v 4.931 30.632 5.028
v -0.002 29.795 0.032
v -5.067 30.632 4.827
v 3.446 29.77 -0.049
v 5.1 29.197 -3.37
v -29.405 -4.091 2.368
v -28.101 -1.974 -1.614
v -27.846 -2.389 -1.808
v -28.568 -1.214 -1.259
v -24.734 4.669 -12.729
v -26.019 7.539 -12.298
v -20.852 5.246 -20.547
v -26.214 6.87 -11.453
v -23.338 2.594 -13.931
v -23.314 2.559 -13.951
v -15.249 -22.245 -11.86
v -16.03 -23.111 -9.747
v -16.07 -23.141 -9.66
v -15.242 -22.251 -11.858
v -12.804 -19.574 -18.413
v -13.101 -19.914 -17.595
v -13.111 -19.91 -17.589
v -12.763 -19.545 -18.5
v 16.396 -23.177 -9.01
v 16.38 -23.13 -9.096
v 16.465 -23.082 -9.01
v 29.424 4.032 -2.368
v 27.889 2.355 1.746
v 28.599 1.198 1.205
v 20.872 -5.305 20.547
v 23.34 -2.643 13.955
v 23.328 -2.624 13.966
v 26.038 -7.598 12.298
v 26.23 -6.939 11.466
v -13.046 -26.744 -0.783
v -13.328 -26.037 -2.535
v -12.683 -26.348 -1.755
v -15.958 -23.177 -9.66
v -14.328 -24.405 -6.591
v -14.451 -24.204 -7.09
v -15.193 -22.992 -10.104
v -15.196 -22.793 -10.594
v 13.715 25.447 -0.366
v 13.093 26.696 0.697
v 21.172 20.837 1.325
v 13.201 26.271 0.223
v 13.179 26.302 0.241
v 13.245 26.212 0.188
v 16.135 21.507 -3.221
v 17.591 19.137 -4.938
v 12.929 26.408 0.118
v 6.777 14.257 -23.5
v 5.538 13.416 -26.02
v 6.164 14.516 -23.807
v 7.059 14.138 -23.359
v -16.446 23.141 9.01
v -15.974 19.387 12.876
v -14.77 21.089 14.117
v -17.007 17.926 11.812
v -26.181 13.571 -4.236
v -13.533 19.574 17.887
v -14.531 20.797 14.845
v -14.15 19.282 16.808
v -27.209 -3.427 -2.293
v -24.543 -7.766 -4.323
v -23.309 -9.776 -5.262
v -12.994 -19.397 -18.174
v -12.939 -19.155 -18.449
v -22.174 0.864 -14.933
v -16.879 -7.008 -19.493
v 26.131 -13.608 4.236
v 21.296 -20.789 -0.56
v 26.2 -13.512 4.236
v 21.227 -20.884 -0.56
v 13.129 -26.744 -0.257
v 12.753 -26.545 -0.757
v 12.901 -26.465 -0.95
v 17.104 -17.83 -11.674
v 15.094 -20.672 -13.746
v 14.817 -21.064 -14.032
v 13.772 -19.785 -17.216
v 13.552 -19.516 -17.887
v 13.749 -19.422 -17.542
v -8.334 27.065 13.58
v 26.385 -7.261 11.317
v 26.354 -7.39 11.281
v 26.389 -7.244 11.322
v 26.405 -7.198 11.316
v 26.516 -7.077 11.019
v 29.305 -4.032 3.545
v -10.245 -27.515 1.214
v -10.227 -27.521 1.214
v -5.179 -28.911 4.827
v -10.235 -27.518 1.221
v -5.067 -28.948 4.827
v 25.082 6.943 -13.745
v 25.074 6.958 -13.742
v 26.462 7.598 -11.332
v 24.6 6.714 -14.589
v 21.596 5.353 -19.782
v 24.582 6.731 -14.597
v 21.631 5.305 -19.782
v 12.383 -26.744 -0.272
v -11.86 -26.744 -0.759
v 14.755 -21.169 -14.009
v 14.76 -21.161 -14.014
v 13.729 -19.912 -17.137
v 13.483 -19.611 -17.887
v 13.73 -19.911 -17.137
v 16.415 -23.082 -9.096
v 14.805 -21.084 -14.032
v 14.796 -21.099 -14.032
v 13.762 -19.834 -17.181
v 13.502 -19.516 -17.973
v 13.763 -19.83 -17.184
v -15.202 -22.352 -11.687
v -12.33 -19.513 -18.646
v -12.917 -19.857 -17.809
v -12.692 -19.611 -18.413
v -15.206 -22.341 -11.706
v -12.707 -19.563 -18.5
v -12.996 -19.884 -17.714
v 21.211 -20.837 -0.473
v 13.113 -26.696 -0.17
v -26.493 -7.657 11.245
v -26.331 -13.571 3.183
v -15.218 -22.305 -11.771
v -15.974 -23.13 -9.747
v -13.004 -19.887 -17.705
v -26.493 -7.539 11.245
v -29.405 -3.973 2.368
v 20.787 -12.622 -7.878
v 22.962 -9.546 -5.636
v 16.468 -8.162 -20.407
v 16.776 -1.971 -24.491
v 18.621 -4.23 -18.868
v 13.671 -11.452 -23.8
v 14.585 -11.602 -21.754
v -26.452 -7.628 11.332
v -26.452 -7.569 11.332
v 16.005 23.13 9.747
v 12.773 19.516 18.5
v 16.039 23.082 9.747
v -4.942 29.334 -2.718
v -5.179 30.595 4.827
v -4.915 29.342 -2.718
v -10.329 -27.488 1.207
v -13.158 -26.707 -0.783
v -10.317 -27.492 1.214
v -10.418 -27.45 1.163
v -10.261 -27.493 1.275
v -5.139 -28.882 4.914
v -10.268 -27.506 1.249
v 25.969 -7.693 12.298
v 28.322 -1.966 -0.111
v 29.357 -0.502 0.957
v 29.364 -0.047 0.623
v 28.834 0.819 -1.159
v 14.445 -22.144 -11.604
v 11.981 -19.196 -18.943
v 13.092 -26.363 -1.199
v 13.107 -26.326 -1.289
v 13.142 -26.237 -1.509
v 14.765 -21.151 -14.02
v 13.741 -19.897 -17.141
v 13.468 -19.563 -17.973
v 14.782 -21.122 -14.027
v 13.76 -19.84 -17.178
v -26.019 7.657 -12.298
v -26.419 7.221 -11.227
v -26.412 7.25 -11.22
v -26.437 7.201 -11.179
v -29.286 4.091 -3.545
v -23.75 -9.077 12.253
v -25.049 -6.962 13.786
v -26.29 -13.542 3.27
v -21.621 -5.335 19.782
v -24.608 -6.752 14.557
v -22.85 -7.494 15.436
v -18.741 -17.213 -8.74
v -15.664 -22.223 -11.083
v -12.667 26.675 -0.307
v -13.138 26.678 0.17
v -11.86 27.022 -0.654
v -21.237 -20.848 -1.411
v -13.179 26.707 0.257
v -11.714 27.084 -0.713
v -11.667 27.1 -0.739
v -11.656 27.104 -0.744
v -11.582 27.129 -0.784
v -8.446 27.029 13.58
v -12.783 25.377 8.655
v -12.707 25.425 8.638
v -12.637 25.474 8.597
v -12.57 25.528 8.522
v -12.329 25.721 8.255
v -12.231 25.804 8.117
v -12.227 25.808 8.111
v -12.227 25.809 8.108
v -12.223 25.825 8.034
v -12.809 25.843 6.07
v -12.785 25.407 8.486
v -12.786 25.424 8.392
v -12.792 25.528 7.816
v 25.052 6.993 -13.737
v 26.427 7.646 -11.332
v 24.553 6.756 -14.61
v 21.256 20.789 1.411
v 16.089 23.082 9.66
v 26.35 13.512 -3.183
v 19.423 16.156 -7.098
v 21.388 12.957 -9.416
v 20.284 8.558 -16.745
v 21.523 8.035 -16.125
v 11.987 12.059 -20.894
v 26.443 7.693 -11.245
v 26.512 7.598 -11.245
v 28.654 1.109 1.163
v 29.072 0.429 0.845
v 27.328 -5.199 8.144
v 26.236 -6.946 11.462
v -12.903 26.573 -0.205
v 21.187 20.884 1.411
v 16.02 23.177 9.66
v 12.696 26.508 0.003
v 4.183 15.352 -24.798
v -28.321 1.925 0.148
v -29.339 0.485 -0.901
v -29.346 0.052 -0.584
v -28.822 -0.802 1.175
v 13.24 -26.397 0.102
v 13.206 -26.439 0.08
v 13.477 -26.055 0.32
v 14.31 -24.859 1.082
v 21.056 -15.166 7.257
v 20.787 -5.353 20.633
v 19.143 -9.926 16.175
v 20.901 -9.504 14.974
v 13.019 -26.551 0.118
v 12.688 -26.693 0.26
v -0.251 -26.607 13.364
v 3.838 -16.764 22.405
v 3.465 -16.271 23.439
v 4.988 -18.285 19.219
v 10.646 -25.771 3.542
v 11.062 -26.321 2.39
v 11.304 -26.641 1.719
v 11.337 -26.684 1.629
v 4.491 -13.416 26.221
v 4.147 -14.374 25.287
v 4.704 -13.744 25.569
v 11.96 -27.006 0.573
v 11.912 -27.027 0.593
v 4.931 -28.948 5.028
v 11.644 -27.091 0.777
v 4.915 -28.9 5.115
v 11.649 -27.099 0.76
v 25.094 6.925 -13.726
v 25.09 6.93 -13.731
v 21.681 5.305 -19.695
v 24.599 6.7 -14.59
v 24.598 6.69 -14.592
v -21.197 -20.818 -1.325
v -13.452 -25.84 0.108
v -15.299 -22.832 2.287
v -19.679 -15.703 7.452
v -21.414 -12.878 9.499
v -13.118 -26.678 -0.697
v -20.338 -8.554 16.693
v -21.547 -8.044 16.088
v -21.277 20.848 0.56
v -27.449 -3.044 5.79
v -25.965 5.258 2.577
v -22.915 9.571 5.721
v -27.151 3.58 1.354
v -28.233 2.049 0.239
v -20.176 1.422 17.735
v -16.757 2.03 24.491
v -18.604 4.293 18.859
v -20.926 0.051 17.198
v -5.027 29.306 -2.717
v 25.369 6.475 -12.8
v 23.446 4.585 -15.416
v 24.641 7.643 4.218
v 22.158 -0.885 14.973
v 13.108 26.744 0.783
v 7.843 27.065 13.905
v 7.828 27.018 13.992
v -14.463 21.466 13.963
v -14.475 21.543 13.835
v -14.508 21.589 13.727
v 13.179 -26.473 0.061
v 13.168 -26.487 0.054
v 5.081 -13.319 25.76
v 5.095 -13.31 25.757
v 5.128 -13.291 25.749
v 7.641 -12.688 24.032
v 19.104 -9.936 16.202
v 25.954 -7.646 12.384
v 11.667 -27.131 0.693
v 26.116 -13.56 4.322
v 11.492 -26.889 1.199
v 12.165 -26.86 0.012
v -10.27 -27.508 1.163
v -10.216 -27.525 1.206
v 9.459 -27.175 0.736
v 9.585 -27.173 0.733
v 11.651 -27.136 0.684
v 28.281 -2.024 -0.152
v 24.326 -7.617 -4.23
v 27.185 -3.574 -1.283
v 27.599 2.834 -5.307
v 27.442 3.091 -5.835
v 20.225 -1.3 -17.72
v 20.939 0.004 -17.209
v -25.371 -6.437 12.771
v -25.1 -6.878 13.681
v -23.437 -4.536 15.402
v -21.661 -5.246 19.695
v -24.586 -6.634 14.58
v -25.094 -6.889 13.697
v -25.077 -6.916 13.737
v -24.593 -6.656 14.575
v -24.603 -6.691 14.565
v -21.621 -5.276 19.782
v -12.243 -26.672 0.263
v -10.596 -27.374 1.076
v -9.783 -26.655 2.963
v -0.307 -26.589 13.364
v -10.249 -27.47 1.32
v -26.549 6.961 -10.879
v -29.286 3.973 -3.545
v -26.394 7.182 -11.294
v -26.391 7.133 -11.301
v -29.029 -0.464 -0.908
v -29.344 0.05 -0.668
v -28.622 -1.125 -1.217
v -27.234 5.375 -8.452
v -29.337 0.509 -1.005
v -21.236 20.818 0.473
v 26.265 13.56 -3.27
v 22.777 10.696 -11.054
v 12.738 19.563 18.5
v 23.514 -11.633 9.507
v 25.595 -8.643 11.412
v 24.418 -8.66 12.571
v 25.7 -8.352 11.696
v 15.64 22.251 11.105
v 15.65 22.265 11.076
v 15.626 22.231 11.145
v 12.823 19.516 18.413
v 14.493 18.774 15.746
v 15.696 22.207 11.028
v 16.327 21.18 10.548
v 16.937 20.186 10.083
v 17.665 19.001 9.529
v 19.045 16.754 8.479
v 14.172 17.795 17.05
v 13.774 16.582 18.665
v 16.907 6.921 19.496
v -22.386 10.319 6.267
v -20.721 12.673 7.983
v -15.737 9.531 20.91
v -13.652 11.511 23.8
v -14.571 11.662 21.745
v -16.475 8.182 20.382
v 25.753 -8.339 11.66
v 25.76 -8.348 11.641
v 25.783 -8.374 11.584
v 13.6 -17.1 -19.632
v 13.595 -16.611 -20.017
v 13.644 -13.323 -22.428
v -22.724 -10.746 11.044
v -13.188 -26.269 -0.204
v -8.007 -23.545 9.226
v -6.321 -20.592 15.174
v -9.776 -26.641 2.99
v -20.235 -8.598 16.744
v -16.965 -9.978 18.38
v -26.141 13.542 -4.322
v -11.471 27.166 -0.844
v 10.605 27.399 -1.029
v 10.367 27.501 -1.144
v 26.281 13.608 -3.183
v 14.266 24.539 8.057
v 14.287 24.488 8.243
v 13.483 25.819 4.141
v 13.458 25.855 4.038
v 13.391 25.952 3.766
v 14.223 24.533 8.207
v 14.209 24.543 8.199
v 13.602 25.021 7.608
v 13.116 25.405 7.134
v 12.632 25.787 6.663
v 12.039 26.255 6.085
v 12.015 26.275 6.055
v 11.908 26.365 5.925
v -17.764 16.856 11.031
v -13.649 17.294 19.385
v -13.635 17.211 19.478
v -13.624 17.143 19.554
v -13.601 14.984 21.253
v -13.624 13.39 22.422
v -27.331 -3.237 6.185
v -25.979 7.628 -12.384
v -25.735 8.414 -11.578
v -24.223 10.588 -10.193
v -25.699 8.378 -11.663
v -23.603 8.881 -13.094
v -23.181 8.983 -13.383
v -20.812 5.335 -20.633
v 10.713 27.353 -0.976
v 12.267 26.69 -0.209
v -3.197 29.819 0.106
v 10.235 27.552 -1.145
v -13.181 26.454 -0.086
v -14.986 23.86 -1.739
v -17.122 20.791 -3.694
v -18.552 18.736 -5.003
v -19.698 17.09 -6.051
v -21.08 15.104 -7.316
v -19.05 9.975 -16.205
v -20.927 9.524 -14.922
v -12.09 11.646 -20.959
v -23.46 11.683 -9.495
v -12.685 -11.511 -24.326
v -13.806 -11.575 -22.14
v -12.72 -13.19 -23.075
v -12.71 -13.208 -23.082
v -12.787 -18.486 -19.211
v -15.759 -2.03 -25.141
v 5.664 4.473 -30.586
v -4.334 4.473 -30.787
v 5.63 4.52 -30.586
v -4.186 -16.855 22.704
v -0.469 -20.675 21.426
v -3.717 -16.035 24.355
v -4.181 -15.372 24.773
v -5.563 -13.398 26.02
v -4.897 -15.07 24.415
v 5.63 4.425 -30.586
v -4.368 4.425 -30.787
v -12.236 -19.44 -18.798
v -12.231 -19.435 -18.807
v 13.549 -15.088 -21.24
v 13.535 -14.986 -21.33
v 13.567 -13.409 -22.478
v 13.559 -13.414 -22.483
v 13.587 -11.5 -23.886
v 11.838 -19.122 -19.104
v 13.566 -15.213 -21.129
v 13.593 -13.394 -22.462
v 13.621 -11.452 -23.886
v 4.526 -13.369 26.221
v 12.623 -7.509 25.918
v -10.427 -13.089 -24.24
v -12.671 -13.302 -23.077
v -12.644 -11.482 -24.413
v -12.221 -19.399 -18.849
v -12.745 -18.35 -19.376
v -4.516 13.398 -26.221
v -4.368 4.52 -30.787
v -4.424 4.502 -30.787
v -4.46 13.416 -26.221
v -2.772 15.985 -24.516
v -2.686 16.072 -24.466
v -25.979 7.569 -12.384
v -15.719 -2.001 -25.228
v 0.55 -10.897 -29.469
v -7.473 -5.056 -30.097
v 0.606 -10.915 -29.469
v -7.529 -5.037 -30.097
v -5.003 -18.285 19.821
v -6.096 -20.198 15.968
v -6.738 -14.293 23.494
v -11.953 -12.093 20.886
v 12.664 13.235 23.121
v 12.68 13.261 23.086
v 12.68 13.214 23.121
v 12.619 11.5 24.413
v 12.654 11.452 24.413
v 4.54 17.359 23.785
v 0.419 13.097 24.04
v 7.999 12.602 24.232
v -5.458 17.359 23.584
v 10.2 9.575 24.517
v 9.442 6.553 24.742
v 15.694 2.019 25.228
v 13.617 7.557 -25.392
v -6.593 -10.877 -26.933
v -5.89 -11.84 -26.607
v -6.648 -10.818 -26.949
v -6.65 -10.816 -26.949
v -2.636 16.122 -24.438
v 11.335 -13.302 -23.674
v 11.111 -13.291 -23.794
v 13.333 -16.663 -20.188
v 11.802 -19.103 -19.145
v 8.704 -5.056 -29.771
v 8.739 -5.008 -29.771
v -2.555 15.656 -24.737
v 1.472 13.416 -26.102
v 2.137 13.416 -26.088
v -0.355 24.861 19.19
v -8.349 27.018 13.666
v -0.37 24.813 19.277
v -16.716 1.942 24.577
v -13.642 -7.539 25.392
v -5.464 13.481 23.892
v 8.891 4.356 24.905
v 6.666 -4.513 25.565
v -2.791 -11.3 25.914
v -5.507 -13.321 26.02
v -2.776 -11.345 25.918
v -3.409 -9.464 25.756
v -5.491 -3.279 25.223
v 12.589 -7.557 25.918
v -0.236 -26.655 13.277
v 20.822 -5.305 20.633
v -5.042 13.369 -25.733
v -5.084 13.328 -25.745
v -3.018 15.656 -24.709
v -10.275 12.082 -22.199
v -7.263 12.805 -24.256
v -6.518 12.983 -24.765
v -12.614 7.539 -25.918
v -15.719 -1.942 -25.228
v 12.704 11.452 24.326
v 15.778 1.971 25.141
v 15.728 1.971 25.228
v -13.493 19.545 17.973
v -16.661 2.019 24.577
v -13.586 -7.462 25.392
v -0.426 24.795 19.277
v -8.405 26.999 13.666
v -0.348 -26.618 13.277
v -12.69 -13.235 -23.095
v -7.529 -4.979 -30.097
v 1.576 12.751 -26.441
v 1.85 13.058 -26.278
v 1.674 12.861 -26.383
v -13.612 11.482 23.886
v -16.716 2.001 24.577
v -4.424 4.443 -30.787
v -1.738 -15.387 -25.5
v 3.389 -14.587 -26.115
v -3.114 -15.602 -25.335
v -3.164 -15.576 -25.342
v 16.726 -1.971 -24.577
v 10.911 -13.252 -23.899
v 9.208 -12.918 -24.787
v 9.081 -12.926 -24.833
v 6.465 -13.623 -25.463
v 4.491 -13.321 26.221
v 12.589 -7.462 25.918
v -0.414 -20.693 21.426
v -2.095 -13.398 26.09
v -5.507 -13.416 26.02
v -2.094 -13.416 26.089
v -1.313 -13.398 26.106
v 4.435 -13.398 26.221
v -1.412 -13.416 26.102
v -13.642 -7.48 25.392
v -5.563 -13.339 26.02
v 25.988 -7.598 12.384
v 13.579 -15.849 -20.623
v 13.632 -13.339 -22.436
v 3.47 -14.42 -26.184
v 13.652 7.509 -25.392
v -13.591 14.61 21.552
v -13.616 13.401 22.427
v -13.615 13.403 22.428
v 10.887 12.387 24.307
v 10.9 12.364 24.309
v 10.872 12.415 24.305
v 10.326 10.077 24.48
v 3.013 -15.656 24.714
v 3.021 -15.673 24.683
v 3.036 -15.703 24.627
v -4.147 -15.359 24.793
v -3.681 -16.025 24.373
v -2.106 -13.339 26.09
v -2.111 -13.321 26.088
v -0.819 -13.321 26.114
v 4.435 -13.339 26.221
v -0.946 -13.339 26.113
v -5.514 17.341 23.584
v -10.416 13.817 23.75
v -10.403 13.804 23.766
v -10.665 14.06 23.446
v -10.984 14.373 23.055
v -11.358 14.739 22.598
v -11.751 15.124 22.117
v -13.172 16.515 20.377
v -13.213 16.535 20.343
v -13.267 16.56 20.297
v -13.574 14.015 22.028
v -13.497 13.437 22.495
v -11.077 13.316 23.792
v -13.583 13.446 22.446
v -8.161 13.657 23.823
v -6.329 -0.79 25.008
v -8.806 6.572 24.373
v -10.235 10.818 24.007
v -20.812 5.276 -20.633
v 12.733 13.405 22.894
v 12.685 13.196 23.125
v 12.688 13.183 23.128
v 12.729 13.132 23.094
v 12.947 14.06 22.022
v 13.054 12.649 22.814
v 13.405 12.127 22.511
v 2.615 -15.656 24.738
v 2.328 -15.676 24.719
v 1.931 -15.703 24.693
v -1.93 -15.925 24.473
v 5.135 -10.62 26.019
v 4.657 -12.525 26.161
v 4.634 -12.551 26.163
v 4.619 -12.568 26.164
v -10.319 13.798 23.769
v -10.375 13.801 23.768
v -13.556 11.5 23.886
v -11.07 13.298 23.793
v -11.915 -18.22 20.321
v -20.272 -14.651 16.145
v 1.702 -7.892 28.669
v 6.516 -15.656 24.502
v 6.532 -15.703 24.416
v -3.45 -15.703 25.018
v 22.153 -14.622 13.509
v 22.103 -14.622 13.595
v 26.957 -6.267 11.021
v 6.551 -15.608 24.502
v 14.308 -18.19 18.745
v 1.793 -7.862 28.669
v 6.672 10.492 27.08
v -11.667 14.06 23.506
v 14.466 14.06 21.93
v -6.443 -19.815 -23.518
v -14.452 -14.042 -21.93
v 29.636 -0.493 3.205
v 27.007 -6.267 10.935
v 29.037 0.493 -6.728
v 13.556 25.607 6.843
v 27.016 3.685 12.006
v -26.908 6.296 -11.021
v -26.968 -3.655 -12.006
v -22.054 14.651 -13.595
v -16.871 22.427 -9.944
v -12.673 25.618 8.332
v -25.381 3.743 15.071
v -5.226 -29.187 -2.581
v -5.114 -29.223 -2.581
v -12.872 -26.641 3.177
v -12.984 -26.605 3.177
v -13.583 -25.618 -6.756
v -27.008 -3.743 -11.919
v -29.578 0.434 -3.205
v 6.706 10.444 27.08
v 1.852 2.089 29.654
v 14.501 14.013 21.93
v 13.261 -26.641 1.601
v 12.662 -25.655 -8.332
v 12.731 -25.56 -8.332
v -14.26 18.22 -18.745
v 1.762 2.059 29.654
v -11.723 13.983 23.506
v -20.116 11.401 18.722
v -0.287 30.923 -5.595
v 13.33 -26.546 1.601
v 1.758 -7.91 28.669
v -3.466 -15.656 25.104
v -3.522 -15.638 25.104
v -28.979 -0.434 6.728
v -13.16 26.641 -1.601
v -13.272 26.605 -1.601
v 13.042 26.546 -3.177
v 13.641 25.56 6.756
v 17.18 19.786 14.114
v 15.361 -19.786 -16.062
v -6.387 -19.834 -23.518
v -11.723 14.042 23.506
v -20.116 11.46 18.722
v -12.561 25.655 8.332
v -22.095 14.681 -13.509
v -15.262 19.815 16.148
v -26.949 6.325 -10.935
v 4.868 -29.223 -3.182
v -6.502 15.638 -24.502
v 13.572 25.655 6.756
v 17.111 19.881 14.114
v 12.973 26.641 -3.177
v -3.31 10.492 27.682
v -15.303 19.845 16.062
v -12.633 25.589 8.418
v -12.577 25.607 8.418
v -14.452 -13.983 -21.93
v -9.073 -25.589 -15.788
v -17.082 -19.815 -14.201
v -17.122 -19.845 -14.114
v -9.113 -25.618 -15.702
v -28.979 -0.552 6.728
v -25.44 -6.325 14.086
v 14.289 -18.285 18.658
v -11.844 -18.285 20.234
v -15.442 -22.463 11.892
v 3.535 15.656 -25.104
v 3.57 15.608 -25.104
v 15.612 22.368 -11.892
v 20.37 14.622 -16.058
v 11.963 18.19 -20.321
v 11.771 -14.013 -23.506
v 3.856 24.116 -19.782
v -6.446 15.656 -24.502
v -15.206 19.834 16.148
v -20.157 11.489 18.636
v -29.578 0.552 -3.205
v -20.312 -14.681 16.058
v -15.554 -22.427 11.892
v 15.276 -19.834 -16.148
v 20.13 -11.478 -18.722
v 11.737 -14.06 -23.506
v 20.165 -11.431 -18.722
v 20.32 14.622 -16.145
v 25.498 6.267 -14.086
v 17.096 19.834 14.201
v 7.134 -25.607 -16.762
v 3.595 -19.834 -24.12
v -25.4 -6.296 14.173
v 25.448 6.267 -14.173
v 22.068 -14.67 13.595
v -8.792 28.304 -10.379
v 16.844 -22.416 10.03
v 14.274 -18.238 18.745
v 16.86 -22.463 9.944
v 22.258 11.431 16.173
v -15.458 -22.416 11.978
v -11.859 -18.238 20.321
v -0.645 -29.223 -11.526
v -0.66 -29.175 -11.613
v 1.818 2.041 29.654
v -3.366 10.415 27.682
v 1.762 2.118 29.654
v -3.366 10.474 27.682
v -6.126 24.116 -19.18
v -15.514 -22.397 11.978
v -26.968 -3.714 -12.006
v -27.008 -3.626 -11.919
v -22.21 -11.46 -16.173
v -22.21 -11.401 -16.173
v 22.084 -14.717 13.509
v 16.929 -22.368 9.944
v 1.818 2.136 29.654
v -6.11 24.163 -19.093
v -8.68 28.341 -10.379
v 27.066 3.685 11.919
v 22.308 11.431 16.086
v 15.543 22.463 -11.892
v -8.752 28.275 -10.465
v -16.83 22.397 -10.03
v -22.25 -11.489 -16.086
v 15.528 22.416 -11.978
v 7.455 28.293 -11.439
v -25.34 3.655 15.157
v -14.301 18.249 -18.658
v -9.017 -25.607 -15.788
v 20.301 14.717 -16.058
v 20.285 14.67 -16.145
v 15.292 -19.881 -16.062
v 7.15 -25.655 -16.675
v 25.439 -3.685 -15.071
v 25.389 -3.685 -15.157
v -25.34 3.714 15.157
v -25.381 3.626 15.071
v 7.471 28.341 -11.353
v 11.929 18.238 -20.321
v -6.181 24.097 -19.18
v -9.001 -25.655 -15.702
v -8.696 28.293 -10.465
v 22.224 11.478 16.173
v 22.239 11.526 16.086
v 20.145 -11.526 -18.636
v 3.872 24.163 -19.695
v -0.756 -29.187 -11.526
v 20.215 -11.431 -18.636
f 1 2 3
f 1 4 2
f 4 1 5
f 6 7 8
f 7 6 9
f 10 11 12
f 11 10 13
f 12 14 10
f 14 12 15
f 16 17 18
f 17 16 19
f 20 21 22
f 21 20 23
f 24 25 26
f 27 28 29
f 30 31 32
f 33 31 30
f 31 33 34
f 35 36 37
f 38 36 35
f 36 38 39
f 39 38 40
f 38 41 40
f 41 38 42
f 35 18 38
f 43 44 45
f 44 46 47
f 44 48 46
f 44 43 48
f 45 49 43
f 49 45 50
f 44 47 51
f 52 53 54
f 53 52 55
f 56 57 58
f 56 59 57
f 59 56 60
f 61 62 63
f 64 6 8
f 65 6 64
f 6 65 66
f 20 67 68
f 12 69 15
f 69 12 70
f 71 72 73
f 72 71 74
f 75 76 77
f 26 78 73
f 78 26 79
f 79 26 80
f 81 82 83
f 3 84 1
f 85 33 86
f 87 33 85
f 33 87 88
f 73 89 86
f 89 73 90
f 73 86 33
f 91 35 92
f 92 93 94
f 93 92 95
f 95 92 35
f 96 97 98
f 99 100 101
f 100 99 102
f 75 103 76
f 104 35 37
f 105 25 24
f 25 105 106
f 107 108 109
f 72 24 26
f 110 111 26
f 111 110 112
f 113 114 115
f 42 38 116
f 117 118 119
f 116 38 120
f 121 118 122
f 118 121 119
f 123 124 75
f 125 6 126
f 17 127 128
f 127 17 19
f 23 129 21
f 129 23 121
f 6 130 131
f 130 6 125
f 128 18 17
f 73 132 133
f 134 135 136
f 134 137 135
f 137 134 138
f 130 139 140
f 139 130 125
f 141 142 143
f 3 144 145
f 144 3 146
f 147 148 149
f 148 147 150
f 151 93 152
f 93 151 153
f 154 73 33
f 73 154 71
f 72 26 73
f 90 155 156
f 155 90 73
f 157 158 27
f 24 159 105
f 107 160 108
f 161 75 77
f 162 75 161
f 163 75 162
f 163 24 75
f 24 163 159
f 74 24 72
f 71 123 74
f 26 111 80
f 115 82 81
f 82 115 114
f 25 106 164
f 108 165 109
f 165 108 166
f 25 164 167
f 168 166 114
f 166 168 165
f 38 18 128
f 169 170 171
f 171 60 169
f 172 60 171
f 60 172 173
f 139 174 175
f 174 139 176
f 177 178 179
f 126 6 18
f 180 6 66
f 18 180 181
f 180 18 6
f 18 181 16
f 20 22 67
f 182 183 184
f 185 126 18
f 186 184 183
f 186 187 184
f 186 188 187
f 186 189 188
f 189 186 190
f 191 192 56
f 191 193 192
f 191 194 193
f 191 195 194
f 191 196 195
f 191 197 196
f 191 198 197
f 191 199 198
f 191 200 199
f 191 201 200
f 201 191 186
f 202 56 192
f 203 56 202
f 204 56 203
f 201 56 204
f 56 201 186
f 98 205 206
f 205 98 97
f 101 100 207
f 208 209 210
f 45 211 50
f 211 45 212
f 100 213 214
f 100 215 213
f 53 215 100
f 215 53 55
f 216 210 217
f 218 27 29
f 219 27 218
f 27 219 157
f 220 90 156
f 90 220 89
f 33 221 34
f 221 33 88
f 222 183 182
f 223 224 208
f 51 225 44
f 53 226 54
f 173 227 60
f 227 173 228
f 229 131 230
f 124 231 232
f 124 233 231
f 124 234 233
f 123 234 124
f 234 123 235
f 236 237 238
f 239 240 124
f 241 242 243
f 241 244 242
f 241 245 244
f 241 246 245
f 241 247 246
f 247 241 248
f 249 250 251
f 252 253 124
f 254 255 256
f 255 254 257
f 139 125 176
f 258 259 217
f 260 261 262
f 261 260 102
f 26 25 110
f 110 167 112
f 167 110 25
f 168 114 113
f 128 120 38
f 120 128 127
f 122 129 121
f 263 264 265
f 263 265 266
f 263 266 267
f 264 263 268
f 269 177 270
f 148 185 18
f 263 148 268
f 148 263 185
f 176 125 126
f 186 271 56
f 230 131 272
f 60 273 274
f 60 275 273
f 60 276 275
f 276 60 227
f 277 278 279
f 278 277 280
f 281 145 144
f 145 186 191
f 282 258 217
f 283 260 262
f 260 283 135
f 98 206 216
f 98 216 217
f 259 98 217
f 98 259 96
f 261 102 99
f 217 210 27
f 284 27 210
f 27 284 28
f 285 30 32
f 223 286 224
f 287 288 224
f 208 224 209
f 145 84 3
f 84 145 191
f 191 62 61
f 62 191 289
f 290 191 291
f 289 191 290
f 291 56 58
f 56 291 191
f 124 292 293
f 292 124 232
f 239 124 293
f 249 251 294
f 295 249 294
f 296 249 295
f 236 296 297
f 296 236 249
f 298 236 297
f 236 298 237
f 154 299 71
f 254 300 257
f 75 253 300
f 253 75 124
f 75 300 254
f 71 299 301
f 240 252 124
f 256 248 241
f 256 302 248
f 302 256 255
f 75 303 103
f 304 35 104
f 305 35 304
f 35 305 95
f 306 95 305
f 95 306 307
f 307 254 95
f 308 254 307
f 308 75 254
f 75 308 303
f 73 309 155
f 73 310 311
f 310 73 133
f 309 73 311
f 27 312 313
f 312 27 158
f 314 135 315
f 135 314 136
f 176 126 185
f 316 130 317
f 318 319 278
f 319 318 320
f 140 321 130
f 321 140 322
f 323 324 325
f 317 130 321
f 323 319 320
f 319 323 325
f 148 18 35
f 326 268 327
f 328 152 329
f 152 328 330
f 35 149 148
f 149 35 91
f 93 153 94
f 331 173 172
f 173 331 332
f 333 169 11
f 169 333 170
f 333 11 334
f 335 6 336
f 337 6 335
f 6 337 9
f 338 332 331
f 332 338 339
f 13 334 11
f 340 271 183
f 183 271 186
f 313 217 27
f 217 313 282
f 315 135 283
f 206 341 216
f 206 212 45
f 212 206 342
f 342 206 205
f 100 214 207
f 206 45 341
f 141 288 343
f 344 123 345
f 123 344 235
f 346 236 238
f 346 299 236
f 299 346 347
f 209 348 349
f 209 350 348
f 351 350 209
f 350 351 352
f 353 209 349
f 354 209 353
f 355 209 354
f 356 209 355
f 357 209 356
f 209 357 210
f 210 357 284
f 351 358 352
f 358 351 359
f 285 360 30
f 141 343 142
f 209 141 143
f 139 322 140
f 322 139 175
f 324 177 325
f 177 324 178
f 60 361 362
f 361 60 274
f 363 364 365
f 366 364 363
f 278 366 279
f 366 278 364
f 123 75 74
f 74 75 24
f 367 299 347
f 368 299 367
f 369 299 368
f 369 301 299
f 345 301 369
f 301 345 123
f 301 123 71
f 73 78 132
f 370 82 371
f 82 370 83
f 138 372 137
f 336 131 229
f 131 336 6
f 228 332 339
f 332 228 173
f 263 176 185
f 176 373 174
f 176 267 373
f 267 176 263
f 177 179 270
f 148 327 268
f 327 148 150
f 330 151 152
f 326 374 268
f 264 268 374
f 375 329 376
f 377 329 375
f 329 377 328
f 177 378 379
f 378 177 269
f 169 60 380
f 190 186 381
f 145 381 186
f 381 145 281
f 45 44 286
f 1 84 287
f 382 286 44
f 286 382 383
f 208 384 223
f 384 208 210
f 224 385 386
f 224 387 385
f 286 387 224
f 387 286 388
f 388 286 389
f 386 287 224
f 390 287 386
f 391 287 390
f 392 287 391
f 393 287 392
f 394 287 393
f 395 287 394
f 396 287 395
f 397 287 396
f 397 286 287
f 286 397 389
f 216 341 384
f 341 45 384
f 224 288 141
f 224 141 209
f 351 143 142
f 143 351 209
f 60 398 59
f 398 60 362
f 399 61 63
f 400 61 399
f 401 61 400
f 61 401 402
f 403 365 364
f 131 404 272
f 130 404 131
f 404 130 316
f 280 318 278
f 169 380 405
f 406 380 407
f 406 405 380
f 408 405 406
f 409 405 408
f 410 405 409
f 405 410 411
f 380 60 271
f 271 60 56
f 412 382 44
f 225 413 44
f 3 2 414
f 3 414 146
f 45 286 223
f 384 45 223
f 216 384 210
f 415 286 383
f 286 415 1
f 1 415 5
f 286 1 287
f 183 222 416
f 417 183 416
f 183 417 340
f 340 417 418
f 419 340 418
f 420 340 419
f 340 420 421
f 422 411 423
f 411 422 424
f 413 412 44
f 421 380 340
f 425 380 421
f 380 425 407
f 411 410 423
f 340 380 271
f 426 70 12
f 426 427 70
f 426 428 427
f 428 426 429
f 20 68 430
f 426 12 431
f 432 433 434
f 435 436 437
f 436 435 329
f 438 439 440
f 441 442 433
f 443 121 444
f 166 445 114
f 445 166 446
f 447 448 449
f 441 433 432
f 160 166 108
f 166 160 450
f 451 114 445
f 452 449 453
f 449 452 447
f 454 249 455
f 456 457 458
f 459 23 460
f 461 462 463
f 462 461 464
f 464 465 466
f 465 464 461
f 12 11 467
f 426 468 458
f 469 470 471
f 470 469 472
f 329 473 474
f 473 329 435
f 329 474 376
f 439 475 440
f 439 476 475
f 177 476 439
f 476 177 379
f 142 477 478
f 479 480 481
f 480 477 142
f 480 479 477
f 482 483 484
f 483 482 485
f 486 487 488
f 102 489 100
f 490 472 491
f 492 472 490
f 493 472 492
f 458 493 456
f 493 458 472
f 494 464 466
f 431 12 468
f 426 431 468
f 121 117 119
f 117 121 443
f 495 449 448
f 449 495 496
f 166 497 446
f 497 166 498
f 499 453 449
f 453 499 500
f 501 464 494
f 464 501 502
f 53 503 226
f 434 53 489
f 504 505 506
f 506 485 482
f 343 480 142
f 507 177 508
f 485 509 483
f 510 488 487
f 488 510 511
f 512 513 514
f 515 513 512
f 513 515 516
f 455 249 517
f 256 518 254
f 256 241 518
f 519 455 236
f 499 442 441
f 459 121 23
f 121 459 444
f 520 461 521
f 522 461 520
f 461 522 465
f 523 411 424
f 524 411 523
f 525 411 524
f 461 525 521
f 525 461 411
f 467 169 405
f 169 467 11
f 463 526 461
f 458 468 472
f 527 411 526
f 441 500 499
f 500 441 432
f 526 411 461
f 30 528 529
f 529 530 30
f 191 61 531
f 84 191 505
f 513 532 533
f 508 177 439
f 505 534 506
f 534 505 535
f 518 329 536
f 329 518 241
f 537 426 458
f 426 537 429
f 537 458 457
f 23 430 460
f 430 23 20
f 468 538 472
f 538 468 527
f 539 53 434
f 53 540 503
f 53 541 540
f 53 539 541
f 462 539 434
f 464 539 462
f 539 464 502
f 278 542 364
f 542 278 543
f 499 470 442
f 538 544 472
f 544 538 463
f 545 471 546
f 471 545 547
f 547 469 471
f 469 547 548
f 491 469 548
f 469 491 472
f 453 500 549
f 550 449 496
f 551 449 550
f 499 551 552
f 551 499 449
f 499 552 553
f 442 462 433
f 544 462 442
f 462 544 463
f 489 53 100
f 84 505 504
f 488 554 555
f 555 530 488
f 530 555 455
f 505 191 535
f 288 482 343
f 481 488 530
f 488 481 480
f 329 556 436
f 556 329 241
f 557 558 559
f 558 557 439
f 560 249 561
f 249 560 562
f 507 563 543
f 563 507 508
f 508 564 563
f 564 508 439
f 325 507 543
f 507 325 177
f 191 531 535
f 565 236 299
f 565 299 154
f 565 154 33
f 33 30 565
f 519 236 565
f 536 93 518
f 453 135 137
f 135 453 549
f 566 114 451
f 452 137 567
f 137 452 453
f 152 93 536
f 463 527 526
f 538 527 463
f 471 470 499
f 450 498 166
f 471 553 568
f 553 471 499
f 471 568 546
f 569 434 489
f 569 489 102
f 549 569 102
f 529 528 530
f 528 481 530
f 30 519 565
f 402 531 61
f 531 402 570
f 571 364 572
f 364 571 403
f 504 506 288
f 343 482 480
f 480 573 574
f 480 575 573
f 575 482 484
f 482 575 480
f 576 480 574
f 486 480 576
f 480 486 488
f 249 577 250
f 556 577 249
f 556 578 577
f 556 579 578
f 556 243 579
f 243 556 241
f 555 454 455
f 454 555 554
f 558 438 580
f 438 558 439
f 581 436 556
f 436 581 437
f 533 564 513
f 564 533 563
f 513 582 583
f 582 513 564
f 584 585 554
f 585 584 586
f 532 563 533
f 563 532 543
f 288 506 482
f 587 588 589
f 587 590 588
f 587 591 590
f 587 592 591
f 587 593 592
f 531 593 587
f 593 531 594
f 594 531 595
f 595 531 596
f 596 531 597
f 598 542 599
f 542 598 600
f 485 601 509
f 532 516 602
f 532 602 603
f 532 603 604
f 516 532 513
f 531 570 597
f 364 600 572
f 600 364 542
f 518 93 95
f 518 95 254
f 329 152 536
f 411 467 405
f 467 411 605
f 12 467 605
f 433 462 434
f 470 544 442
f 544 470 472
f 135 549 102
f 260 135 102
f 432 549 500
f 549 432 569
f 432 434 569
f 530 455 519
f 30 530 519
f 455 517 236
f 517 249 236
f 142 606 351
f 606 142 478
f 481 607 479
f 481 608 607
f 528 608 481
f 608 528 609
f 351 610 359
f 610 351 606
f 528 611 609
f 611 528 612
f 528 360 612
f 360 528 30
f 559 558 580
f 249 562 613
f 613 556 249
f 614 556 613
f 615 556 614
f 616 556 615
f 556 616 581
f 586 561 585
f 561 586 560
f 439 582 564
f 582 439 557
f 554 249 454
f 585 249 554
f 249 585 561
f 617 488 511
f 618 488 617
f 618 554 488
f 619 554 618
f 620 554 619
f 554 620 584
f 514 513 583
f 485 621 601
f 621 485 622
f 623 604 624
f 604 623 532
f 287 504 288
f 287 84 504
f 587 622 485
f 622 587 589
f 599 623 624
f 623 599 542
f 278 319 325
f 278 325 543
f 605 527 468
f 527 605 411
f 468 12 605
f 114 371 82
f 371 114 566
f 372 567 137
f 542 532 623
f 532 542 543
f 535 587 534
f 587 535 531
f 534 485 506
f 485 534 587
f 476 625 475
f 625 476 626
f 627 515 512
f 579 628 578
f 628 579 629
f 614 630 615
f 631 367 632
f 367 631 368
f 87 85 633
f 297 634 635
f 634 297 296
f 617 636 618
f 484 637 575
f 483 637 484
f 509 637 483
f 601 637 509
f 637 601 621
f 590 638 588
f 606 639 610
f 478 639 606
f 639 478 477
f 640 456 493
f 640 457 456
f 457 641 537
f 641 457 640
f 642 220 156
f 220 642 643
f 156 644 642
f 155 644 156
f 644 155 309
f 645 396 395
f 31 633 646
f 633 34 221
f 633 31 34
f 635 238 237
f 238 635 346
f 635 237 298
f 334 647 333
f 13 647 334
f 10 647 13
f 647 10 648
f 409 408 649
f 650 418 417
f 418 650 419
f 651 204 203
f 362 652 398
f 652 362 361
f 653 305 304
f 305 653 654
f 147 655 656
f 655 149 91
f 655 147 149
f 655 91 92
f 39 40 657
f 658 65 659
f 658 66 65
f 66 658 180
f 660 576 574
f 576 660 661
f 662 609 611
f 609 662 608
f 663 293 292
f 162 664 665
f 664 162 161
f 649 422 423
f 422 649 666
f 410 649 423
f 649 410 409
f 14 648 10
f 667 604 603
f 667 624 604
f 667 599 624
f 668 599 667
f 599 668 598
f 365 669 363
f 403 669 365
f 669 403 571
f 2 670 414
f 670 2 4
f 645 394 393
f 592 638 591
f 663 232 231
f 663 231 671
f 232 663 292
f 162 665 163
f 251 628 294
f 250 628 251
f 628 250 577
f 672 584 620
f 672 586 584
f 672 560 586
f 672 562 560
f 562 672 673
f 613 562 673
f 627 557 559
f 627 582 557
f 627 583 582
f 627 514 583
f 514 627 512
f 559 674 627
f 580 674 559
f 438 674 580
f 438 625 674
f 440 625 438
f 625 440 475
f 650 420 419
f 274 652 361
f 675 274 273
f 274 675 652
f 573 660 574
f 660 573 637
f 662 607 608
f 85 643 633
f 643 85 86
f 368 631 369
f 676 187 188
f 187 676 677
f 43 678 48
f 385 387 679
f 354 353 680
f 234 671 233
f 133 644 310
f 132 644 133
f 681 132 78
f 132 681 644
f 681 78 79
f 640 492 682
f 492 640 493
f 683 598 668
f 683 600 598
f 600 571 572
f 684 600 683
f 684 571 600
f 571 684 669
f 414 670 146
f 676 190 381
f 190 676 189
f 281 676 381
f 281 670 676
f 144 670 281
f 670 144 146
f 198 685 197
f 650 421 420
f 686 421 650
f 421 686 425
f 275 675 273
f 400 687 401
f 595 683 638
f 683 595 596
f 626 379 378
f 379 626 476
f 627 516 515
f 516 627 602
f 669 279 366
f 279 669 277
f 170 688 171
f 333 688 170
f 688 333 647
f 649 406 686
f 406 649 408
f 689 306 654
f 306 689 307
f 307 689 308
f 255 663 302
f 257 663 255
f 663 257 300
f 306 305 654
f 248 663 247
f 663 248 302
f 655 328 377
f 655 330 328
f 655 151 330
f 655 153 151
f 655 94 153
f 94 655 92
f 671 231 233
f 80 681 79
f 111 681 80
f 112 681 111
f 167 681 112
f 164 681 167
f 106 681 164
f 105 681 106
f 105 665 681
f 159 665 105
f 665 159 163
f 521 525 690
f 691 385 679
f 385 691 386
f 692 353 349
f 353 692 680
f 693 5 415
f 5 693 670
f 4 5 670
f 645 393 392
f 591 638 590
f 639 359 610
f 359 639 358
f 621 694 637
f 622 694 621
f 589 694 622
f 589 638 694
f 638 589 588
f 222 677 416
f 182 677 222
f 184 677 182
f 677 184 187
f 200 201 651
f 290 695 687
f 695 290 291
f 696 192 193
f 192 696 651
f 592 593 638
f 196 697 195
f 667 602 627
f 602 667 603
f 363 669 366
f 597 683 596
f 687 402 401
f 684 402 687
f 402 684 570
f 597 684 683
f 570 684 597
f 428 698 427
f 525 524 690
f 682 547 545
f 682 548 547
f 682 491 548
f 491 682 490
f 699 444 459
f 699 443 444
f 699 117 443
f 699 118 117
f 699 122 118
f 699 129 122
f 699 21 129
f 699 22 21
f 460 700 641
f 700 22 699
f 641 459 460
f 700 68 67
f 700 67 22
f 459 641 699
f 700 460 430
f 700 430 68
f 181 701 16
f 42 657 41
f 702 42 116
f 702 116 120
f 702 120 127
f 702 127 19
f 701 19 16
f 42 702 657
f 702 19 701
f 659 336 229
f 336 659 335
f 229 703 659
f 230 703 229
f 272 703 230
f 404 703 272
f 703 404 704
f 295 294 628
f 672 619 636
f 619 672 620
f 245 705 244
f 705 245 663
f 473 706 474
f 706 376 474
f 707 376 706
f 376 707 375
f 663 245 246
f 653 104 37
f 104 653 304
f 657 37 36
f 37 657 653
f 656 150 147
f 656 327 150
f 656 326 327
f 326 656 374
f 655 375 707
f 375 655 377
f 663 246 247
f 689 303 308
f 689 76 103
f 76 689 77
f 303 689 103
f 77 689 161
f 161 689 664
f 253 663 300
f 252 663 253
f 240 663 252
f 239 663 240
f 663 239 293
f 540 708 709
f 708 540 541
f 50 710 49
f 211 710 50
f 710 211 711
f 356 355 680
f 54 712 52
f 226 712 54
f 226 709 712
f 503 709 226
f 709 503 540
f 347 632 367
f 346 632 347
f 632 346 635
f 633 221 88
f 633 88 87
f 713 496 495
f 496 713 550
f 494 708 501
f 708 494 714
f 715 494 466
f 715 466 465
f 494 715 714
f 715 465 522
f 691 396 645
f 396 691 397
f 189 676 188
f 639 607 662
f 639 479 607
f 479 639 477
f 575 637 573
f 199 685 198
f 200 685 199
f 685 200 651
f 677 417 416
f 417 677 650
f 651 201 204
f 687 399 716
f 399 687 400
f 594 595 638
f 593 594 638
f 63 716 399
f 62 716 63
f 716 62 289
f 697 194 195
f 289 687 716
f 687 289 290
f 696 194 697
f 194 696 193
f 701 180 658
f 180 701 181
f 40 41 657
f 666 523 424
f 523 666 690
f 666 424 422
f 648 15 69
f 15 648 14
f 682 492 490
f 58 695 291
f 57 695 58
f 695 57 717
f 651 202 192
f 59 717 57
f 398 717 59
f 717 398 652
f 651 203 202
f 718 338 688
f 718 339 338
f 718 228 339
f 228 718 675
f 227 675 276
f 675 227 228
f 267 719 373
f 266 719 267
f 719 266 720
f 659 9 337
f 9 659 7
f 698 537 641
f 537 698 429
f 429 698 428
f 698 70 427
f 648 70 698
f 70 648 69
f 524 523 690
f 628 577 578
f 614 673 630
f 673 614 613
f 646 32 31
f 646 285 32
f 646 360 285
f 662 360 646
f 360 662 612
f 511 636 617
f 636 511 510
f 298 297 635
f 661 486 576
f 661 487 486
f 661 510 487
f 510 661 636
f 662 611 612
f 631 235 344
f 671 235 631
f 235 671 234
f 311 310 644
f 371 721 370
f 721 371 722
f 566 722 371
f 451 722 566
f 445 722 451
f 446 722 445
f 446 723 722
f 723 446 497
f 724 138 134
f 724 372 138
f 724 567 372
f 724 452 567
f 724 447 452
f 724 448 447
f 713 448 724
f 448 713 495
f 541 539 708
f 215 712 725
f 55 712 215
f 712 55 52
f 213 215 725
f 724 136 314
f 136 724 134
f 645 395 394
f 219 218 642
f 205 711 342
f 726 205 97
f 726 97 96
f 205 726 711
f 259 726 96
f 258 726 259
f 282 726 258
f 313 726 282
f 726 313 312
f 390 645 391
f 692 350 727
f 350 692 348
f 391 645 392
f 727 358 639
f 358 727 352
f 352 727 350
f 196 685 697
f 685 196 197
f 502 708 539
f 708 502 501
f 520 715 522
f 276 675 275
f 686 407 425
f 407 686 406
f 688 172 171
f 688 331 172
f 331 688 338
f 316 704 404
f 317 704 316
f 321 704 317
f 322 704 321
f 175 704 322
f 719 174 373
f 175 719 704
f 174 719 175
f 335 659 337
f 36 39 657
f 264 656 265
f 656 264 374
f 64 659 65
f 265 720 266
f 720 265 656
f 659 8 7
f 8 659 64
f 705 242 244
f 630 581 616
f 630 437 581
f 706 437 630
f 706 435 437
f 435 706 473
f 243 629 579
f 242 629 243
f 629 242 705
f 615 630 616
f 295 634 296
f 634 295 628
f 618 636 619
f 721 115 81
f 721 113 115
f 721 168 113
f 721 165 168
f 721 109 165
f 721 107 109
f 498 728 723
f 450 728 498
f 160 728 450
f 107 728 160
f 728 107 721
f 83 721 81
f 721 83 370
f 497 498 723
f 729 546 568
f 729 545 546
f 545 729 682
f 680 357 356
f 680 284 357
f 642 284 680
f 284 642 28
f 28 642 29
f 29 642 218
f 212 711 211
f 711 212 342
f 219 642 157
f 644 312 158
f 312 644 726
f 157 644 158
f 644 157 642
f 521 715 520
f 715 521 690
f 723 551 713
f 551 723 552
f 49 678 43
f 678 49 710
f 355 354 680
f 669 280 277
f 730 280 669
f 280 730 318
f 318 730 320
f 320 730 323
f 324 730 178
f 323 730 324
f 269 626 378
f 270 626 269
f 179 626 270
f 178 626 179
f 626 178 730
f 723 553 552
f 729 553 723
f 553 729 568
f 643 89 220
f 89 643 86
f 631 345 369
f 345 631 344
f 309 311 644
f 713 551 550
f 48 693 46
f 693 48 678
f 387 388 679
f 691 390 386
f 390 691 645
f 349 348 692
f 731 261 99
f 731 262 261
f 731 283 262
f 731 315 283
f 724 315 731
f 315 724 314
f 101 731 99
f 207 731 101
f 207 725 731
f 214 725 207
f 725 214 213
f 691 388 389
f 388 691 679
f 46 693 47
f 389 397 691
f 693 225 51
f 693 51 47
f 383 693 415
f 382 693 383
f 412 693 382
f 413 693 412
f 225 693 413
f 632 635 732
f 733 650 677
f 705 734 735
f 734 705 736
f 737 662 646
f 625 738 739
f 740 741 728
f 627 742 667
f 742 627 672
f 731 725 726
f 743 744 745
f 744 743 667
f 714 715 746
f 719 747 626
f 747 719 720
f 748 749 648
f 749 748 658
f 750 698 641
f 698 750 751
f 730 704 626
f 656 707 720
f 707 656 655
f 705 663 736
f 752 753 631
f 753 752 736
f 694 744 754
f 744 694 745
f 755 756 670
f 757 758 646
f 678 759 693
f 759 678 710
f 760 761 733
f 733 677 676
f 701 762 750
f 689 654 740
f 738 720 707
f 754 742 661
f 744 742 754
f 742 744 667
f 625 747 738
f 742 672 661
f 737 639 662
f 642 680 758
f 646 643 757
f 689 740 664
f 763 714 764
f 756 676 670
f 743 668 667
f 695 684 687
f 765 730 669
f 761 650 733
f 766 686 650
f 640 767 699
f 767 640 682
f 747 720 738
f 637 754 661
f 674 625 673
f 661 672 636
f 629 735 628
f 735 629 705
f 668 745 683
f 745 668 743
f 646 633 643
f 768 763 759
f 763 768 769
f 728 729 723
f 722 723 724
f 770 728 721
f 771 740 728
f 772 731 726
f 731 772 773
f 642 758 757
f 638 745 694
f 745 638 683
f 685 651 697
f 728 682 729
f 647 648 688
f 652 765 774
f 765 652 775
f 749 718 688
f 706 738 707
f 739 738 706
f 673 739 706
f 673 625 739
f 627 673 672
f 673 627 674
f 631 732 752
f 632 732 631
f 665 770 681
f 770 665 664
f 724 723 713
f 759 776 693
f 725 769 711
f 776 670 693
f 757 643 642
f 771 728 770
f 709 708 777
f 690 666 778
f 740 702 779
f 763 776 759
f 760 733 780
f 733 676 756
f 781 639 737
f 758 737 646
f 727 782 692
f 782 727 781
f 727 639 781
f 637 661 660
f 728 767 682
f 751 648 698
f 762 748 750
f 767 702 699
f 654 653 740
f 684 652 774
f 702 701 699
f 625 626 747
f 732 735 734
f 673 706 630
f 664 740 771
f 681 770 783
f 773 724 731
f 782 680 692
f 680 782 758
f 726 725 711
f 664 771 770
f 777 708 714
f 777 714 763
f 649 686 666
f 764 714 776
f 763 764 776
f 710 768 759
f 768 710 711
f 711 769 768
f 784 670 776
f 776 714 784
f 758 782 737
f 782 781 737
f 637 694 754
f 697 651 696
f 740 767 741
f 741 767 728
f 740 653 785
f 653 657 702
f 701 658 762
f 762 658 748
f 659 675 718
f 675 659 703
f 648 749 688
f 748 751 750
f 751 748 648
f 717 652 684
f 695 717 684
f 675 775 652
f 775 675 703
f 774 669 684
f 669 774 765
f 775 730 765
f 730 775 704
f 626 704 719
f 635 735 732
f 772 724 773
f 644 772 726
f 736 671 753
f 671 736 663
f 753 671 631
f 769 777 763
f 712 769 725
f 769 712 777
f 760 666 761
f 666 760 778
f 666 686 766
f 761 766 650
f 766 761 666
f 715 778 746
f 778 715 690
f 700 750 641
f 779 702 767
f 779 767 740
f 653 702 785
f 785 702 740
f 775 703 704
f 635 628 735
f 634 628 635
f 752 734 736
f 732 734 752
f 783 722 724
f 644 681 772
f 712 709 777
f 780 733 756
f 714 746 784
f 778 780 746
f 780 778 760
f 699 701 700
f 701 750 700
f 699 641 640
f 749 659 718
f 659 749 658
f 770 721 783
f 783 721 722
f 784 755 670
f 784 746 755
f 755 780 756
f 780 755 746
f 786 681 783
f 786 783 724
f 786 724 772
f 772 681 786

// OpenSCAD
// Auto-generated OpenSCAD file

    inner_points = 10*[[-0.17041080214674126, 0.7862375594247885, -2.8582778861302787], [0.1802309286658651, 0.2088872902636722, 2.9567222750529307], [-0.17634695174386278, -0.20888728923371336, -2.9567222750529307], [0.17429477906874358, -0.7862375583948297, 2.8582778861302787], [-2.9497504156068732, 0.04931160049722948, -0.3204805387029167], [-2.889853657259625, -0.04931159952382933, 0.6728400755788456], [2.893737634181627, 0.04931160055378816, -0.6728400755788456], [2.9536343925288753, -0.04931159946727065, 0.3204805387029167], [-0.47977606233285736, 2.9127811671079766, 0.3182468427064288], [-0.5145268873613189, -2.9127811660876786, -0.25805664805191697], [0.5184108642833212, 2.912781167117638, 0.25805664805191697], [0.48366003925485973, -2.9127811660780174, -0.3182468427064288], [-0.6461927033123381, 1.5608342286633365, -2.4415866544877143], [-0.3325692049742699, 1.044436449194514, 2.7595076053434417], [-0.6617337447199062, -1.0444364481742165, -2.69931741068893], [-0.3481102463818381, -1.5608342276430391, 2.501776849142226], [0.35199422330384045, 1.560834228672998, -2.501776849142226], [0.6656177216419085, 1.0444364492041753, 2.69931741068893], [0.33645318189627227, -1.0444364481645552, -2.7595076053434417], [0.6500766802343404, -1.5608342276333778, 2.4415866544877143], [-2.6867831123319075, 0.6266618696861422, -1.0934713951014787], [-2.5299713631628737, 0.3684629799517309, 1.5070757348140993], [-2.692719261929029, -0.3684629789723597, -1.1919157840241308], [-2.5359075127599953, -0.6266618687067711, 1.4086313458914472], [2.5397914896819973, 0.6266618697367299, -1.4086313458914472], [2.696603238851031, 0.3684629800023185, 1.1919157840241308], [2.533855340084876, -0.3684629789217721, -1.5070757348140993], [2.6906670892539095, -0.6266618686561835, 1.0934713951014787], [-1.3191089998085306, 2.654582277350415, -0.16013956324217252], [-1.2592122414612827, 2.5559590773293563, 0.8331810510395898], [-1.3501910826236672, -2.555959076324691, -0.6756010756446058], [-1.2902943242764193, -2.6545822763457494, 0.31771953863715663], [1.2941783011984218, 2.6545822773757086, -0.31771953863715663], [1.3540750595456696, 2.5559590773546503, 0.6756010756446058], [1.2630962183832852, -2.555959076299397, -0.8331810510395898], [1.322992976730533, -2.654582276320456, 0.16013956324217252], [-1.4219601402274384, 1.8190331184052655, -1.8658104677986405], [-1.1682334002366181, 1.4012585389575019, 2.341963177750754], [-1.4411699238483318, -1.4012585379528368, -2.1843832023557694], [-1.1874431838575115, -1.8190331174006005, 2.0233904431936245], [1.191327160779514, 1.8190331184305593, -2.0233904431936245], [1.4450539007703342, 1.4012585389827956, 2.1843832023557694], [1.1721173771586206, -1.401258537927543, -2.341963177750754], [1.425844117149441, -1.8190331173753067, 1.8658104677986405], [-2.201396319355864, 1.4622110286266452, -1.350876259465479], [-2.0075663377122916, 1.1430596491999403, 1.8635767718021523], [-2.216937360763432, -1.1430596482109077, -1.6086070156666958], [-2.02310737911986, -1.4622110276376128, 1.6058460156009355], [2.026991356041862, 1.4622110286675716, -1.6058460156009355], [2.220821337685434, 1.1430596492408664, 1.6086070156666958], [2.0114503146342937, -1.1430596481699815, -1.8635767718021523], [2.205280296277866, -1.4622110275966864, 1.350876259465479], [-1.6789912939052822, 2.236807697874855, -0.9943752224774262], [-1.5221795447362483, 1.9786088081404438, 1.606171907438152], [-1.704137227123297, -1.9786088071417498, -1.411392345957207], [-1.5473254779542631, -2.2368076968761605, 1.189154783958371], [1.5512094548762656, 2.2368076979061198, -1.189154783958371], [1.7080212040452996, 1.9786088081717086, 1.411392345957207], [1.5260635216582508, -1.978608807110485, -1.606171907438152], [1.6828752708272847, -2.2368076968448958, 0.9943752224774262], [-0.8711277587214085, 2.8245698953316367, -1.0378735875155352], [-0.9032238569451155, -2.5559590763240982, -1.5701514091469855], [0.7439726156693655, 2.8245698953472695, -1.1352633682560076], [0.7118765174456584, -2.555959076308466, -1.667541189887458], [-0.6140966050435644, 2.4067953158620474, -1.9093088328367496], [-0.6402565536701501, -1.9786088071351857, -2.343142265545548], [0.38409032157261397, 2.406795315871709, -1.9694990274912612], [0.35793037294602836, -1.9786088071255243, -2.4033324602000596], [-0.03179482124573489, 3.0827687850891983, -0.5594871815669338], [-0.06755966168276713, -2.9127811660870866, -1.1526069815542968]];

    outer_points = 10*[[0.02669300107192015, 2.6559559407120075, -1.327709675532447], [-0.042901108049307975, -2.064522788314904, 2.1339007964918846], [0.042901108049307975, 2.064522788314904, -2.1339007964918846], [-0.02669300107192015, -2.6559559407120075, 1.327709675532447], [-2.9205155693857976, 0.40317701641016973, -0.35449197483984196], [-2.932403662473765, -0.40317701641016973, 0.2368216872694541], [2.932403662473765, 0.40317701641016973, -0.2368216872694541], [2.9205155693857976, -0.40317701641016973, 0.35449197483984196], [-0.5473409378859402, 1.731154990176565, 2.349712270792537], [-0.4524570269604289, -1.731154990176565, -2.3698127555891437], [0.4524570269604289, 1.731154990176565, 2.3698127555891437], [0.5473409378859402, -1.731154990176565, -2.349712270792537], [-0.4899922381375115, 2.885258312413753, -0.5028116297625187], [-0.5522391016689532, -1.3368662173646406, 2.593346901066097], [-0.4475588631774159, 1.3368662173646406, -2.613447385862704], [-0.5098057267088576, -2.885258312413753, 0.48271114496591183], [0.5098057267088576, 2.885258312413753, -0.48271114496591183], [0.4475588631774159, -1.3368662173646406, 2.613447385862704], [0.5522391016689532, 1.3368662173646406, -2.593346901066097], [0.4899922381375115, -2.885258312413753, 0.5028116297625187], [-2.6100473914566003, 1.3512477086431498, -0.4235678246153023], [-2.641170823222321, -0.7598145562460469, 1.1245114407990056], [-2.5938392844792126, 0.7598145562460469, -1.22975894557474], [-2.6249627162449336, -1.3512477086431498, 0.318320319839568], [2.6249627162449336, 1.3512477086431498, -0.318320319839568], [2.5938392844792126, -0.7598145562460469, 1.22975894557474], [2.641170823222321, 0.7598145562460469, -1.1245114407990056], [2.6100473914566003, -1.3512477086431498, 0.4235678246153023], [-1.3452418553414955, 1.951569111459282, 1.7886670488516037], [-1.3571299484294628, 1.1452150786389423, 2.3799807109609], [-1.2603751054213042, -1.1452150786389423, -2.4326044633487673], [-1.2722631985092714, -1.951569111459282, -1.8412908012394709], [1.2722631985092714, 1.951569111459282, 1.8412908012394709], [1.2603751054213042, 1.1452150786389423, 2.4326044633487673], [1.3571299484294628, -1.1452150786389423, -2.3799807109609], [1.3452418553414955, -1.951569111459282, -1.7886670488516037], [-1.309798409686354, 2.6648441911310363, 0.025710324587154474], [-1.3601571801298284, -0.7509263058270181, 2.530555193306474], [-1.2573478737209385, 0.7509263058270181, -2.5831789456943413], [-1.307706644164413, -2.6648441911310363, -0.07833407697502164], [1.307706644164413, 2.6648441911310363, 0.07833407697502164], [1.2573478737209385, -0.7509263058270181, 2.5831789456943413], [1.3601571801298284, 0.7509263058270181, -2.530555193306474], [1.309798409686354, -2.6648441911310363, -0.025710324587154474], [-2.119587420229877, 2.0789042795934134, 0.05597876475551708], [-2.158058097585384, -0.5305121845443014, 1.969509971365541], [-2.077154045269781, 0.5305121845443014, -2.0546569913446686], [-2.115624722625288, -2.0789042795934134, -0.14112578473464457], [2.115624722625288, 2.0789042795934134, 0.14112578473464457], [2.077154045269781, -0.5305121845443014, 2.0546569913446686], [2.158058097585384, 0.5305121845443014, -1.969509971365541], [2.119587420229877, -2.0789042795934134, -0.05597876475551708], [-1.6364746945929391, 2.308206651295159, 0.9009772953220524], [-1.6675981263586601, 0.1971443864059621, 2.44905656073636], [-1.5678160516501356, -0.1971443864059621, -2.5141030959188813], [-1.5989394834158566, -2.308206651295159, -0.9660238305045731], [1.5989394834158566, 2.308206651295159, 0.9660238305045731], [1.5678160516501356, 0.1971443864059621, 2.5141030959188813], [1.6675981263586601, -0.1971443864059621, -2.44905656073636], [1.6364746945929391, -2.308206651295159, -0.9009772953220524], [-0.8364820114928158, 2.697002179477167, 1.3579781096013481], [-0.7488465863649101, -0.5008108542945804, -3.0010072869159212], [0.7812250775115821, 2.697002179477167, 1.3905013771926082], [0.8688605026394878, -0.5008108542945804, -2.9684840193246607], [-0.5098057265862307, 3.0536397193130442, 0.48271113886644995], [-0.43837840843571274, 0.4472598379384001, -3.0700831366913817], [0.48999223826013844, 3.0536397193130442, 0.5028116236630568], [0.5614195564106563, 0.4472598379384001, -3.049982651894775], [-0.03858109403726045, 2.4765880581944497, 1.9190233315422813], [0.05907149209596527, -1.0867507658322033, -2.938215579156298]];

    // Convex hull for inner set (I)
    module inner_hull() {
        hull() {
            for (p = inner_points) {
                translate(p) sphere(r=0.1);
            }
        }
    }

    // Convex hull for outer set (O) minus inner hull (O \ I)
    module outer_minus_inner() {
        difference() {
            hull() {
                for (p = outer_points) {
                    translate(p) sphere(r=0.1);
                }
            }
            inner_hull(); // Subtract inner hull
        }
    }

    // Convex hull for outer set (O) minus all translated inner hulls
    module outer_minus_AllTranslationInner() {
        difference() {
            hull() {
                for (p = outer_points) {
                    translate(p) sphere(r=0.1);
                }
            }
            hull() {
                translate([0,0,50]) inner_hull();
                translate([0,0,-50]) inner_hull();
            }; // Subtract translated inner hulls
        }
    }

    // Difference between outer_minus_inner and outer_minus_AllTranslationInner
    module outer_minus_inner_diff() {
        difference() {
            // Outer minus inner
            difference() {
                hull() {
                    for (p = outer_points) {
                        translate(p) sphere(r=0.1);
                    }
                }
                inner_hull();
            }

            // Subtract Outer minus AllTranslationInner
            difference() {
                hull() {
                    for (p = outer_points) {
                        translate(p) sphere(r=0.1);
                    }
                }
                hull() {
                    translate([0,0,50]) inner_hull();
                    translate([0,0,-50]) inner_hull();
                };
            }
        }
    }

    // Rendering all with colors applied
    color([1, 0, 0, 0.5]) inner_hull(); // Transparent red
    color([0, 1, 0, 1]) outer_minus_AllTranslationInner(); // Opaque green
    color([1, 1, 0, 1]) outer_minus_inner_diff(); // Opaque yellow
    
